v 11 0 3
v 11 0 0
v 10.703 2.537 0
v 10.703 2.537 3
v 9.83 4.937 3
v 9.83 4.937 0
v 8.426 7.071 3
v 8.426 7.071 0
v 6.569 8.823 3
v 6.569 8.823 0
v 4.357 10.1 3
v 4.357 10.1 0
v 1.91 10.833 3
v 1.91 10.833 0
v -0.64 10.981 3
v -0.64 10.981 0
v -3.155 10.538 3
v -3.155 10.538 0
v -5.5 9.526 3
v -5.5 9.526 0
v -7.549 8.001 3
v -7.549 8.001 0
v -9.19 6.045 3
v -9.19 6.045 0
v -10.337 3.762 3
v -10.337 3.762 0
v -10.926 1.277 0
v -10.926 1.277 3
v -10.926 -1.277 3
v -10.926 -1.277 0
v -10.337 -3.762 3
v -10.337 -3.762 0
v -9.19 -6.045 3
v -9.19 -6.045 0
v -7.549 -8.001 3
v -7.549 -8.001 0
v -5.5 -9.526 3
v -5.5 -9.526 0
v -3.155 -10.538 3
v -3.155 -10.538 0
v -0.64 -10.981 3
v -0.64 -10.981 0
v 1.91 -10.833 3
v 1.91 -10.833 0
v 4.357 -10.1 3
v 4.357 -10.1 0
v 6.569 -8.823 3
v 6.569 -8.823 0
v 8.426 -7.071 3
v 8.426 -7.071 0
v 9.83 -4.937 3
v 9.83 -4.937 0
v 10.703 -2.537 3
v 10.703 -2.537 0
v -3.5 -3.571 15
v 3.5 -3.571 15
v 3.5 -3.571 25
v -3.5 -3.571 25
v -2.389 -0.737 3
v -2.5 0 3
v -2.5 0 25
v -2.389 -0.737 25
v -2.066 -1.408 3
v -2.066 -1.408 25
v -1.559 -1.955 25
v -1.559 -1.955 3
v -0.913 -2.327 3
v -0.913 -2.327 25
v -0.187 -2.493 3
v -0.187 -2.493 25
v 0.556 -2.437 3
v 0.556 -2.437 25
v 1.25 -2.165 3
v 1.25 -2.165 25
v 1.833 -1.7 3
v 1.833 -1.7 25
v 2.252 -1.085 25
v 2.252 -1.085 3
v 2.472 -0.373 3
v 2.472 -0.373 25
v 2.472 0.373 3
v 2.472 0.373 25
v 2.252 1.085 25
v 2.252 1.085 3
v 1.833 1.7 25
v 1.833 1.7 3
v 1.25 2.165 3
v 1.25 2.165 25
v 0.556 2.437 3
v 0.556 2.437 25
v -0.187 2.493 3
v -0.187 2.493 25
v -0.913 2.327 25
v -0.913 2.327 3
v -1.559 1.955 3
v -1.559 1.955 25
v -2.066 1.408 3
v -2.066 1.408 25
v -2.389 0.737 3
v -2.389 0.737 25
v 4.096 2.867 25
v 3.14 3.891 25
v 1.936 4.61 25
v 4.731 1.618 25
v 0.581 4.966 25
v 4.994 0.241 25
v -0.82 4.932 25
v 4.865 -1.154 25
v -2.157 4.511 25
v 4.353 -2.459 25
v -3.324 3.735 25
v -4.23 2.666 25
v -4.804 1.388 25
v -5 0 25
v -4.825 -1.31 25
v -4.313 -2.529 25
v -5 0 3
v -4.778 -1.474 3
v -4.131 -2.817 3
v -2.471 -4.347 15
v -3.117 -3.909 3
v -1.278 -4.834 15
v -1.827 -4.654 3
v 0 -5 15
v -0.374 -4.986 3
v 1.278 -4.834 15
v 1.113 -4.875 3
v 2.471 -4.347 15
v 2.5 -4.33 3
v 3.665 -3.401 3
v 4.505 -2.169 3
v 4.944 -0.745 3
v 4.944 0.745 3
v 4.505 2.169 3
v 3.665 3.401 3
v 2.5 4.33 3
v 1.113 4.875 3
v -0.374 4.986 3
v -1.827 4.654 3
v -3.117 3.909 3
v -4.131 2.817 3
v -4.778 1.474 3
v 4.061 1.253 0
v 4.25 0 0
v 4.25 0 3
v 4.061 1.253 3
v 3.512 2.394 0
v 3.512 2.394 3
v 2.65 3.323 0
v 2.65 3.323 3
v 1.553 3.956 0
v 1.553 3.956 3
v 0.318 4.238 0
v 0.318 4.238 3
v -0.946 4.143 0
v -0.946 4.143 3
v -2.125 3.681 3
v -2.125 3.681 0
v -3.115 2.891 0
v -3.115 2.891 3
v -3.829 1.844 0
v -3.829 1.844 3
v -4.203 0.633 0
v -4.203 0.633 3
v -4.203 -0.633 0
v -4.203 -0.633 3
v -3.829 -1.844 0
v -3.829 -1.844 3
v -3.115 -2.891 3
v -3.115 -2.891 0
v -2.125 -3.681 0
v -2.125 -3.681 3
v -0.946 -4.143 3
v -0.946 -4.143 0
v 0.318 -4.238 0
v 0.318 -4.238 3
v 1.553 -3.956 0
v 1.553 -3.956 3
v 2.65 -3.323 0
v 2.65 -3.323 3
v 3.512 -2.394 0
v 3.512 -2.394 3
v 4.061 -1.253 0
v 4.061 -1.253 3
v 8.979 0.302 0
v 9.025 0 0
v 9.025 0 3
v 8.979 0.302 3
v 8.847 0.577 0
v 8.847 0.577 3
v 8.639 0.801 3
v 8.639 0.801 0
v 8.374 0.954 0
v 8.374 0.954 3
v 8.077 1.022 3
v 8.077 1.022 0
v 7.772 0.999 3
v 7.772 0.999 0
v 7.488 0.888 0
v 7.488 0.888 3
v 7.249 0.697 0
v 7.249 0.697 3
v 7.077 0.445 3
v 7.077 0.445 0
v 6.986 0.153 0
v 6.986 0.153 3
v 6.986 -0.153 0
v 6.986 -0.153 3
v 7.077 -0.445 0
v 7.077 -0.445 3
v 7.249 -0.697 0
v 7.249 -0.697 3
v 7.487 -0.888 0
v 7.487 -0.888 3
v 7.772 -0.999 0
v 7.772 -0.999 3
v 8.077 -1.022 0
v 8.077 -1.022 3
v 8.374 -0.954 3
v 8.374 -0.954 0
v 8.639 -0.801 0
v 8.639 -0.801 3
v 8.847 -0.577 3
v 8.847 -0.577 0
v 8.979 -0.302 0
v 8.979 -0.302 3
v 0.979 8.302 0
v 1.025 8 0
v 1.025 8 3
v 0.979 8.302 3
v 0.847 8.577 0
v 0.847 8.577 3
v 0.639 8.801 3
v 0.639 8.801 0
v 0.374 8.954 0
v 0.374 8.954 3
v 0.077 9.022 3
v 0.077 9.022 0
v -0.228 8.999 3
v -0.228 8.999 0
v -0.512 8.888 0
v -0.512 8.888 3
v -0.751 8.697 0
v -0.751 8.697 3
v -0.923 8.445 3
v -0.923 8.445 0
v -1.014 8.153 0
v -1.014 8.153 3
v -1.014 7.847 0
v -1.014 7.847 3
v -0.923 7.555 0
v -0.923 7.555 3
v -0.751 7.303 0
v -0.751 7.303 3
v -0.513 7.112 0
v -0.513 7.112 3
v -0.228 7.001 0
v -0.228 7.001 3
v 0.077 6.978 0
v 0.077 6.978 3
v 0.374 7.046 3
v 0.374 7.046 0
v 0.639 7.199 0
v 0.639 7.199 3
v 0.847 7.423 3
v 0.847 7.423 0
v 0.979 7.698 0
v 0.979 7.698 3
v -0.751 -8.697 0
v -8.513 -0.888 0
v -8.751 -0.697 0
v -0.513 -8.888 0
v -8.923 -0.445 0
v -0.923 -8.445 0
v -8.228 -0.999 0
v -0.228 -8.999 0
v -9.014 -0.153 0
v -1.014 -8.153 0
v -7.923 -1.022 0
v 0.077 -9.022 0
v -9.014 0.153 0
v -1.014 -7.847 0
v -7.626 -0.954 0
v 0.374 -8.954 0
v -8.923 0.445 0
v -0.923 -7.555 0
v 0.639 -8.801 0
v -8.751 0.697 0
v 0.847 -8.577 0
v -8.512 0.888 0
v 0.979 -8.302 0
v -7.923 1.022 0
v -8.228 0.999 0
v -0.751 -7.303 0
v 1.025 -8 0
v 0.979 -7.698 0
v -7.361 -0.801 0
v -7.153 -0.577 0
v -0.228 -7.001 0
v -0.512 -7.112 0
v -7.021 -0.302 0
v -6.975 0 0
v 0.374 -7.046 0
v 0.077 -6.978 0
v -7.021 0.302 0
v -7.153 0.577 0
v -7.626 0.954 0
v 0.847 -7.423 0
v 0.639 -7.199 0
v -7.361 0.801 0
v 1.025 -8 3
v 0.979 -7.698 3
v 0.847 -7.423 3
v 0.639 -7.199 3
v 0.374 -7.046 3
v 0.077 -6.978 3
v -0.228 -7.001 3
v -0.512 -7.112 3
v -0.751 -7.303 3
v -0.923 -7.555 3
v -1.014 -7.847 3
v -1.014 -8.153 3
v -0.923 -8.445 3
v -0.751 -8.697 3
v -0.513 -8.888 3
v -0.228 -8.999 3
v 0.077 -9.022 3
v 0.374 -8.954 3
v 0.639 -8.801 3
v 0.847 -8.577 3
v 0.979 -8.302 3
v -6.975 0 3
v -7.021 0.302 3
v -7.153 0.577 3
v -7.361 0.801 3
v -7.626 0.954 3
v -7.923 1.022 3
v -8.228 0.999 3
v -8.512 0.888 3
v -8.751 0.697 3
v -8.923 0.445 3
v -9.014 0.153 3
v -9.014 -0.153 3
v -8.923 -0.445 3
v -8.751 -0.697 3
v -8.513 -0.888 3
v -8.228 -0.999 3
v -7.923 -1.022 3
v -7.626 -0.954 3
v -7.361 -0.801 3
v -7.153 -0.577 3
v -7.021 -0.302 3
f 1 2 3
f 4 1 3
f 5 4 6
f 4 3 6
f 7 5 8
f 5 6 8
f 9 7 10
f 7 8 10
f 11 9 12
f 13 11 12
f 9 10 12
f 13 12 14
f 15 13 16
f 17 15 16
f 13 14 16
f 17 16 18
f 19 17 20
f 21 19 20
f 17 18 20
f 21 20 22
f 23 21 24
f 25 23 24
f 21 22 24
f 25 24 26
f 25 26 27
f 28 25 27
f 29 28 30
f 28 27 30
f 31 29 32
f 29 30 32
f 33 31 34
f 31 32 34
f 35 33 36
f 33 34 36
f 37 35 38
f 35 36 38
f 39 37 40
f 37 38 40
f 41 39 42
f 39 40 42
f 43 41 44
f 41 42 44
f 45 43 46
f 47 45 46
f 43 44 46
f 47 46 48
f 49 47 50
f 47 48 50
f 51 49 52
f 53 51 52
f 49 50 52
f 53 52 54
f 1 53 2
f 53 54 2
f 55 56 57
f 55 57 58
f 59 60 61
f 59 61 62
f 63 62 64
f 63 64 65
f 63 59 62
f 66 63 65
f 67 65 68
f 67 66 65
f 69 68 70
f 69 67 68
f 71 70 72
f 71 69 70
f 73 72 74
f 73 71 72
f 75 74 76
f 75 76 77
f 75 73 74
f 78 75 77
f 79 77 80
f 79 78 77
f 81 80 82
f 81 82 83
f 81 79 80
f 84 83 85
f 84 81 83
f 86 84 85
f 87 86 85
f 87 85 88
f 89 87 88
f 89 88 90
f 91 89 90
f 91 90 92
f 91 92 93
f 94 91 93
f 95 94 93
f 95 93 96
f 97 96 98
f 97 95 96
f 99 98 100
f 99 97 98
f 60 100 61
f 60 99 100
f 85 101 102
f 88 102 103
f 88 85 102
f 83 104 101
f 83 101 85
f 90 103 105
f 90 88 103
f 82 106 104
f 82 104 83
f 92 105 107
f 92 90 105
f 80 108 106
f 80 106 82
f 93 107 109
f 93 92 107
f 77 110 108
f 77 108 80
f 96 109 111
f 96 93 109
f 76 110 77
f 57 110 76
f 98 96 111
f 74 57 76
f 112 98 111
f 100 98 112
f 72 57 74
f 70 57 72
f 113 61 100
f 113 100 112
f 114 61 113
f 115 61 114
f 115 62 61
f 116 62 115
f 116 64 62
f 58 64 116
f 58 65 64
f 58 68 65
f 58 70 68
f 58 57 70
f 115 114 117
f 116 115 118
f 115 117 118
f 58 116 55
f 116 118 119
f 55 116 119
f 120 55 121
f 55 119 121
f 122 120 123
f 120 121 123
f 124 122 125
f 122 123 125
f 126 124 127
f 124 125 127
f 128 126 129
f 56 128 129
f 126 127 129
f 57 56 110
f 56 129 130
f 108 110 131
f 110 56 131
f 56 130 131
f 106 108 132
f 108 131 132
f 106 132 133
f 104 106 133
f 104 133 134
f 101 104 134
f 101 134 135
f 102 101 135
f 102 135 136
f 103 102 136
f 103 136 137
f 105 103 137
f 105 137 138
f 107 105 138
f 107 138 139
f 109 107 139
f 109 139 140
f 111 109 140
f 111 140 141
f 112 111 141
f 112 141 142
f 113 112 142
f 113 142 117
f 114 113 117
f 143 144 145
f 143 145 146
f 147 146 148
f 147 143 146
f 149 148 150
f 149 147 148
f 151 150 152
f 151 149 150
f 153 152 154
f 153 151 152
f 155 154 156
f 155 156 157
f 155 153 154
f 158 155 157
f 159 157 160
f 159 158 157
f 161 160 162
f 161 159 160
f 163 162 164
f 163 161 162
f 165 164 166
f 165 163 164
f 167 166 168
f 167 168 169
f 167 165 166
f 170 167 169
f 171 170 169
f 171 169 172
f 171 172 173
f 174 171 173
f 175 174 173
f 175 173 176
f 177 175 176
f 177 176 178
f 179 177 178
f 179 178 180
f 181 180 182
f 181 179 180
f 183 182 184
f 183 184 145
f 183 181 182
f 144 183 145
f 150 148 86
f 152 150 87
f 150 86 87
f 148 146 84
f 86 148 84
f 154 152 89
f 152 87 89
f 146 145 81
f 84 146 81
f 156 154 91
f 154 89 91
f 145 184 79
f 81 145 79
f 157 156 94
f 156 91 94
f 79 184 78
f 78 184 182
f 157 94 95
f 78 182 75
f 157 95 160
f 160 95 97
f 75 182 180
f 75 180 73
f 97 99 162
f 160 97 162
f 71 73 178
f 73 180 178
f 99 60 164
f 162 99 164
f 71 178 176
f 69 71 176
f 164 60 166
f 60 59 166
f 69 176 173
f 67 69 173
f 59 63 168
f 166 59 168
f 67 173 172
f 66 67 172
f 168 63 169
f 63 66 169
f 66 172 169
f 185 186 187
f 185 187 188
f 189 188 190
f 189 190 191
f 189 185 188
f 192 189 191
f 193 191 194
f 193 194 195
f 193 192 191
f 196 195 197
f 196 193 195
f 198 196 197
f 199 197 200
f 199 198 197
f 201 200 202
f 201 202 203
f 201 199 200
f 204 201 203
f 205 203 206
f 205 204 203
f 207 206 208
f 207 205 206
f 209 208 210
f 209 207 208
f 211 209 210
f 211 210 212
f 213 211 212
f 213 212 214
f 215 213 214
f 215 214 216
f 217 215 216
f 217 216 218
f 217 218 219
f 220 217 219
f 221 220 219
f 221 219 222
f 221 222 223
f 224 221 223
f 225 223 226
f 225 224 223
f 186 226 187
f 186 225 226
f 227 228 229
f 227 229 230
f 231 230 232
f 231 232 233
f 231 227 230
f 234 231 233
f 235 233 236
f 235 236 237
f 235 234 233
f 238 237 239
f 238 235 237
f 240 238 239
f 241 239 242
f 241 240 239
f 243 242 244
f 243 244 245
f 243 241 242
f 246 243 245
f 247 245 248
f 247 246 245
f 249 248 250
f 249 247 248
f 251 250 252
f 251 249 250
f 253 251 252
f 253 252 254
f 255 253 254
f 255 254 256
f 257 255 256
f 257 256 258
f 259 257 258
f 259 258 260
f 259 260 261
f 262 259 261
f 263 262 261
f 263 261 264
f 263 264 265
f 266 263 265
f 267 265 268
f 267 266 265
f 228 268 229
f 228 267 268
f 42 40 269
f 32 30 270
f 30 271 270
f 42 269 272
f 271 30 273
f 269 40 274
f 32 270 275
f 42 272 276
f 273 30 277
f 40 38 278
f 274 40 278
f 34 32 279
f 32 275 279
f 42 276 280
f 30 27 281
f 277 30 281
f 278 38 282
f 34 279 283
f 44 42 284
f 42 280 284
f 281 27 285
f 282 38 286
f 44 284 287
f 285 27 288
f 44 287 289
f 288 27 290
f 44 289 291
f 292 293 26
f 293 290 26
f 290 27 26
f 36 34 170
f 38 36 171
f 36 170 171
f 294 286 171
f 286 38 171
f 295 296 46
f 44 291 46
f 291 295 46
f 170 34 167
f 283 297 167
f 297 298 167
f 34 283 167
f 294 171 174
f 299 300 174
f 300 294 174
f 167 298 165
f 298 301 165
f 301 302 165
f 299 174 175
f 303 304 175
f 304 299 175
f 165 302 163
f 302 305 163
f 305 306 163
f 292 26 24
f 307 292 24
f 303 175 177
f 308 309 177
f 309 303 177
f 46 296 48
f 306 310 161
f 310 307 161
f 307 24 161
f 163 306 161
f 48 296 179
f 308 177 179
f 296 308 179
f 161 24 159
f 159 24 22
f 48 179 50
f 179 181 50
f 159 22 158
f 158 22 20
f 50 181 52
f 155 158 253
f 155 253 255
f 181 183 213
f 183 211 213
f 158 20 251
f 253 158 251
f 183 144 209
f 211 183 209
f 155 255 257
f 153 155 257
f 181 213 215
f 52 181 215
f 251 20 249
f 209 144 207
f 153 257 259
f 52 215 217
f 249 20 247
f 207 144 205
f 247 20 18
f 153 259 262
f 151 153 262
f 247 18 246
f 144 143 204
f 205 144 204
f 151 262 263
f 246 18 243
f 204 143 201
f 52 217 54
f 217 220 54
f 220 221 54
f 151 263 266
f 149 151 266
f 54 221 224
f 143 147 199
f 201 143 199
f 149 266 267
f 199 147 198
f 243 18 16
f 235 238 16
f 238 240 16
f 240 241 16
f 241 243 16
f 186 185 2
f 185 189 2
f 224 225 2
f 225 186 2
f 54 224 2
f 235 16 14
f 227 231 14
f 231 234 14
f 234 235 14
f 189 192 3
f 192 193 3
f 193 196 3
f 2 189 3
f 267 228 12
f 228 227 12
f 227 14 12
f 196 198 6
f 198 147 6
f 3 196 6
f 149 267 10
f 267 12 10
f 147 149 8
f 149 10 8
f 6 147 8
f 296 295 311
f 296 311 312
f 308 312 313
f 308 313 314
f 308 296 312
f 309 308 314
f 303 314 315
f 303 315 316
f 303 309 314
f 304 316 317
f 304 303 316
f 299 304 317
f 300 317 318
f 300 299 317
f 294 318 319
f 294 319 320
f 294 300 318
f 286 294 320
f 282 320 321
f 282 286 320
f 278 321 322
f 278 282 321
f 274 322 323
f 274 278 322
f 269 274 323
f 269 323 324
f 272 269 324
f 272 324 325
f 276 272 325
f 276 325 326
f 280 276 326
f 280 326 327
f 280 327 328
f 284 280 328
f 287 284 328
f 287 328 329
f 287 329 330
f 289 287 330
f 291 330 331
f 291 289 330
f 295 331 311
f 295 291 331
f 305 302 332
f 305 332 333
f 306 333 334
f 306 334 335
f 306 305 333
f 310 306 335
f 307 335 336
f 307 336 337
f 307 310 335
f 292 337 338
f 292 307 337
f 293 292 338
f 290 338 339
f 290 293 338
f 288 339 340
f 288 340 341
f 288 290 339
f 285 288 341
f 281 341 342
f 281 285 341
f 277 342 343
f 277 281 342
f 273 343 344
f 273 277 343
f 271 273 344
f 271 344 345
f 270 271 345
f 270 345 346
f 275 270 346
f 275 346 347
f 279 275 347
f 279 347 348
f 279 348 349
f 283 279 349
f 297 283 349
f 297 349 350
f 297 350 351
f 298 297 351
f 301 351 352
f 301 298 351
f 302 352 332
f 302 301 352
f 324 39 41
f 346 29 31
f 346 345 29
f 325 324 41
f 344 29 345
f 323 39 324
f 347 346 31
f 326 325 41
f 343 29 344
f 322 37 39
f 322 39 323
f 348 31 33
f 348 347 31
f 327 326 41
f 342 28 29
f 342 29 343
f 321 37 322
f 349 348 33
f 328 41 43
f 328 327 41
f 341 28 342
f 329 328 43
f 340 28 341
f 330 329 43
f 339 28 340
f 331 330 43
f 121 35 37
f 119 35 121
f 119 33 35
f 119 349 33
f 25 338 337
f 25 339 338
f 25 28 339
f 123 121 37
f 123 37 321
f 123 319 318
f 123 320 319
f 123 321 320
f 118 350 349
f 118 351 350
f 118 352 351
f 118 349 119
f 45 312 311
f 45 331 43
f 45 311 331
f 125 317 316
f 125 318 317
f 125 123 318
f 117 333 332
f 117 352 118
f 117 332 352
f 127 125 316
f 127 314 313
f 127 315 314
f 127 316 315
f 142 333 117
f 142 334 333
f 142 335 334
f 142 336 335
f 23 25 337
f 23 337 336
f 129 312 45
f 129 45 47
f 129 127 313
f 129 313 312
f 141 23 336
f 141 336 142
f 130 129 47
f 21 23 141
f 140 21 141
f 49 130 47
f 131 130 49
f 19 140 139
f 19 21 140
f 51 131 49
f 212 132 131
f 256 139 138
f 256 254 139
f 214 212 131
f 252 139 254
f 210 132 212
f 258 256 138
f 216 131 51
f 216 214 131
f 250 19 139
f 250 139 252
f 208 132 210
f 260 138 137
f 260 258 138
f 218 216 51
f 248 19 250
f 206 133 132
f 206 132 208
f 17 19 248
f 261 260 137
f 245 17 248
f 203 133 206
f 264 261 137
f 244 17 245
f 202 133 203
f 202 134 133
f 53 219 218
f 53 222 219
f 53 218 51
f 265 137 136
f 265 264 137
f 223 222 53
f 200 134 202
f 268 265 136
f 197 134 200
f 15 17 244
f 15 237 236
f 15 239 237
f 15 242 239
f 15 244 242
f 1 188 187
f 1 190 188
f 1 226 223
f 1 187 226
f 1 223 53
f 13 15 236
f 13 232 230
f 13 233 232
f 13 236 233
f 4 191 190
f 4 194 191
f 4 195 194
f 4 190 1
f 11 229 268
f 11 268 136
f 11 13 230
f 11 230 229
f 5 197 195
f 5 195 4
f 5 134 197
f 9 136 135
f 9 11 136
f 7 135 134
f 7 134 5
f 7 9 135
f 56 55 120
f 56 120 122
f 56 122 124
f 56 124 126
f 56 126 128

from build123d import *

# Parameters (mm, degrees)
SKETCH1_R           = 11
SKETCH1_R_2         = 1.025
SKETCH1_R_3         = 4.25
BOSS_EXTRUDE1_DEPTH = 3
SKETCH2_R           = 5
SKETCH2_R_2         = 2.5
BOSS_EXTRUDE2_DEPTH = 22
CUT_EXTRUDE1_START  = -10
CUT_EXTRUDE1_DEPTH  = 10


with BuildPart() as part:
    # Sketch1 → Boss-Extrude1 (new body)
    with BuildSketch(Plane(origin=(0, 0, 0), x_dir=(0, 1, 0), z_dir=(0, 0, 1))):
        with Locations(Location((0, 0, 0), (0, 0, 270))):
            Circle(SKETCH1_R)
        with Locations(Location((0, 8, 0), (0, 0, 270))):
            Circle(SKETCH1_R_2, mode=Mode.SUBTRACT)
        with Locations(Location((0, 0, 0), (0, 0, 270))):
            Circle(SKETCH1_R_3, mode=Mode.SUBTRACT)
        with Locations(Location((8, 0, 0), (0, 0, 270))):
            Circle(SKETCH1_R_2, mode=Mode.SUBTRACT)
        with Locations(Location((0, -8, 0), (0, 0, 270))):
            Circle(SKETCH1_R_2, mode=Mode.SUBTRACT)
        with Locations(Location((-8, 0, 0), (0, 0, 270))):
            Circle(SKETCH1_R_2, mode=Mode.SUBTRACT)
    extrude(amount=BOSS_EXTRUDE1_DEPTH)

    # Sketch2 → Boss-Extrude2 (add)
    with BuildSketch(Plane.XY.offset(3)):
        with Locations(Location((0, 0, 0), (0, 0, 180))):
            Circle(SKETCH2_R)
        with Locations(Location((0, 0, 0), (0, 0, 180))):
            Circle(SKETCH2_R_2, mode=Mode.SUBTRACT)
    extrude(amount=BOSS_EXTRUDE2_DEPTH)

    # Sketch3 → Cut-Extrude1 (cut)
    with BuildSketch(Plane.XY.offset(25).offset(CUT_EXTRUDE1_START)):
        with BuildLine():
            Line((3.5, -3.570714214), (-3.5, -3.570714214))
            ThreePointArc((-3.5, -3.570714214), (0, -5), (3.5, -3.570714214))
        make_face()
    extrude(amount=CUT_EXTRUDE1_DEPTH, mode=Mode.SUBTRACT)


solid = part.part
